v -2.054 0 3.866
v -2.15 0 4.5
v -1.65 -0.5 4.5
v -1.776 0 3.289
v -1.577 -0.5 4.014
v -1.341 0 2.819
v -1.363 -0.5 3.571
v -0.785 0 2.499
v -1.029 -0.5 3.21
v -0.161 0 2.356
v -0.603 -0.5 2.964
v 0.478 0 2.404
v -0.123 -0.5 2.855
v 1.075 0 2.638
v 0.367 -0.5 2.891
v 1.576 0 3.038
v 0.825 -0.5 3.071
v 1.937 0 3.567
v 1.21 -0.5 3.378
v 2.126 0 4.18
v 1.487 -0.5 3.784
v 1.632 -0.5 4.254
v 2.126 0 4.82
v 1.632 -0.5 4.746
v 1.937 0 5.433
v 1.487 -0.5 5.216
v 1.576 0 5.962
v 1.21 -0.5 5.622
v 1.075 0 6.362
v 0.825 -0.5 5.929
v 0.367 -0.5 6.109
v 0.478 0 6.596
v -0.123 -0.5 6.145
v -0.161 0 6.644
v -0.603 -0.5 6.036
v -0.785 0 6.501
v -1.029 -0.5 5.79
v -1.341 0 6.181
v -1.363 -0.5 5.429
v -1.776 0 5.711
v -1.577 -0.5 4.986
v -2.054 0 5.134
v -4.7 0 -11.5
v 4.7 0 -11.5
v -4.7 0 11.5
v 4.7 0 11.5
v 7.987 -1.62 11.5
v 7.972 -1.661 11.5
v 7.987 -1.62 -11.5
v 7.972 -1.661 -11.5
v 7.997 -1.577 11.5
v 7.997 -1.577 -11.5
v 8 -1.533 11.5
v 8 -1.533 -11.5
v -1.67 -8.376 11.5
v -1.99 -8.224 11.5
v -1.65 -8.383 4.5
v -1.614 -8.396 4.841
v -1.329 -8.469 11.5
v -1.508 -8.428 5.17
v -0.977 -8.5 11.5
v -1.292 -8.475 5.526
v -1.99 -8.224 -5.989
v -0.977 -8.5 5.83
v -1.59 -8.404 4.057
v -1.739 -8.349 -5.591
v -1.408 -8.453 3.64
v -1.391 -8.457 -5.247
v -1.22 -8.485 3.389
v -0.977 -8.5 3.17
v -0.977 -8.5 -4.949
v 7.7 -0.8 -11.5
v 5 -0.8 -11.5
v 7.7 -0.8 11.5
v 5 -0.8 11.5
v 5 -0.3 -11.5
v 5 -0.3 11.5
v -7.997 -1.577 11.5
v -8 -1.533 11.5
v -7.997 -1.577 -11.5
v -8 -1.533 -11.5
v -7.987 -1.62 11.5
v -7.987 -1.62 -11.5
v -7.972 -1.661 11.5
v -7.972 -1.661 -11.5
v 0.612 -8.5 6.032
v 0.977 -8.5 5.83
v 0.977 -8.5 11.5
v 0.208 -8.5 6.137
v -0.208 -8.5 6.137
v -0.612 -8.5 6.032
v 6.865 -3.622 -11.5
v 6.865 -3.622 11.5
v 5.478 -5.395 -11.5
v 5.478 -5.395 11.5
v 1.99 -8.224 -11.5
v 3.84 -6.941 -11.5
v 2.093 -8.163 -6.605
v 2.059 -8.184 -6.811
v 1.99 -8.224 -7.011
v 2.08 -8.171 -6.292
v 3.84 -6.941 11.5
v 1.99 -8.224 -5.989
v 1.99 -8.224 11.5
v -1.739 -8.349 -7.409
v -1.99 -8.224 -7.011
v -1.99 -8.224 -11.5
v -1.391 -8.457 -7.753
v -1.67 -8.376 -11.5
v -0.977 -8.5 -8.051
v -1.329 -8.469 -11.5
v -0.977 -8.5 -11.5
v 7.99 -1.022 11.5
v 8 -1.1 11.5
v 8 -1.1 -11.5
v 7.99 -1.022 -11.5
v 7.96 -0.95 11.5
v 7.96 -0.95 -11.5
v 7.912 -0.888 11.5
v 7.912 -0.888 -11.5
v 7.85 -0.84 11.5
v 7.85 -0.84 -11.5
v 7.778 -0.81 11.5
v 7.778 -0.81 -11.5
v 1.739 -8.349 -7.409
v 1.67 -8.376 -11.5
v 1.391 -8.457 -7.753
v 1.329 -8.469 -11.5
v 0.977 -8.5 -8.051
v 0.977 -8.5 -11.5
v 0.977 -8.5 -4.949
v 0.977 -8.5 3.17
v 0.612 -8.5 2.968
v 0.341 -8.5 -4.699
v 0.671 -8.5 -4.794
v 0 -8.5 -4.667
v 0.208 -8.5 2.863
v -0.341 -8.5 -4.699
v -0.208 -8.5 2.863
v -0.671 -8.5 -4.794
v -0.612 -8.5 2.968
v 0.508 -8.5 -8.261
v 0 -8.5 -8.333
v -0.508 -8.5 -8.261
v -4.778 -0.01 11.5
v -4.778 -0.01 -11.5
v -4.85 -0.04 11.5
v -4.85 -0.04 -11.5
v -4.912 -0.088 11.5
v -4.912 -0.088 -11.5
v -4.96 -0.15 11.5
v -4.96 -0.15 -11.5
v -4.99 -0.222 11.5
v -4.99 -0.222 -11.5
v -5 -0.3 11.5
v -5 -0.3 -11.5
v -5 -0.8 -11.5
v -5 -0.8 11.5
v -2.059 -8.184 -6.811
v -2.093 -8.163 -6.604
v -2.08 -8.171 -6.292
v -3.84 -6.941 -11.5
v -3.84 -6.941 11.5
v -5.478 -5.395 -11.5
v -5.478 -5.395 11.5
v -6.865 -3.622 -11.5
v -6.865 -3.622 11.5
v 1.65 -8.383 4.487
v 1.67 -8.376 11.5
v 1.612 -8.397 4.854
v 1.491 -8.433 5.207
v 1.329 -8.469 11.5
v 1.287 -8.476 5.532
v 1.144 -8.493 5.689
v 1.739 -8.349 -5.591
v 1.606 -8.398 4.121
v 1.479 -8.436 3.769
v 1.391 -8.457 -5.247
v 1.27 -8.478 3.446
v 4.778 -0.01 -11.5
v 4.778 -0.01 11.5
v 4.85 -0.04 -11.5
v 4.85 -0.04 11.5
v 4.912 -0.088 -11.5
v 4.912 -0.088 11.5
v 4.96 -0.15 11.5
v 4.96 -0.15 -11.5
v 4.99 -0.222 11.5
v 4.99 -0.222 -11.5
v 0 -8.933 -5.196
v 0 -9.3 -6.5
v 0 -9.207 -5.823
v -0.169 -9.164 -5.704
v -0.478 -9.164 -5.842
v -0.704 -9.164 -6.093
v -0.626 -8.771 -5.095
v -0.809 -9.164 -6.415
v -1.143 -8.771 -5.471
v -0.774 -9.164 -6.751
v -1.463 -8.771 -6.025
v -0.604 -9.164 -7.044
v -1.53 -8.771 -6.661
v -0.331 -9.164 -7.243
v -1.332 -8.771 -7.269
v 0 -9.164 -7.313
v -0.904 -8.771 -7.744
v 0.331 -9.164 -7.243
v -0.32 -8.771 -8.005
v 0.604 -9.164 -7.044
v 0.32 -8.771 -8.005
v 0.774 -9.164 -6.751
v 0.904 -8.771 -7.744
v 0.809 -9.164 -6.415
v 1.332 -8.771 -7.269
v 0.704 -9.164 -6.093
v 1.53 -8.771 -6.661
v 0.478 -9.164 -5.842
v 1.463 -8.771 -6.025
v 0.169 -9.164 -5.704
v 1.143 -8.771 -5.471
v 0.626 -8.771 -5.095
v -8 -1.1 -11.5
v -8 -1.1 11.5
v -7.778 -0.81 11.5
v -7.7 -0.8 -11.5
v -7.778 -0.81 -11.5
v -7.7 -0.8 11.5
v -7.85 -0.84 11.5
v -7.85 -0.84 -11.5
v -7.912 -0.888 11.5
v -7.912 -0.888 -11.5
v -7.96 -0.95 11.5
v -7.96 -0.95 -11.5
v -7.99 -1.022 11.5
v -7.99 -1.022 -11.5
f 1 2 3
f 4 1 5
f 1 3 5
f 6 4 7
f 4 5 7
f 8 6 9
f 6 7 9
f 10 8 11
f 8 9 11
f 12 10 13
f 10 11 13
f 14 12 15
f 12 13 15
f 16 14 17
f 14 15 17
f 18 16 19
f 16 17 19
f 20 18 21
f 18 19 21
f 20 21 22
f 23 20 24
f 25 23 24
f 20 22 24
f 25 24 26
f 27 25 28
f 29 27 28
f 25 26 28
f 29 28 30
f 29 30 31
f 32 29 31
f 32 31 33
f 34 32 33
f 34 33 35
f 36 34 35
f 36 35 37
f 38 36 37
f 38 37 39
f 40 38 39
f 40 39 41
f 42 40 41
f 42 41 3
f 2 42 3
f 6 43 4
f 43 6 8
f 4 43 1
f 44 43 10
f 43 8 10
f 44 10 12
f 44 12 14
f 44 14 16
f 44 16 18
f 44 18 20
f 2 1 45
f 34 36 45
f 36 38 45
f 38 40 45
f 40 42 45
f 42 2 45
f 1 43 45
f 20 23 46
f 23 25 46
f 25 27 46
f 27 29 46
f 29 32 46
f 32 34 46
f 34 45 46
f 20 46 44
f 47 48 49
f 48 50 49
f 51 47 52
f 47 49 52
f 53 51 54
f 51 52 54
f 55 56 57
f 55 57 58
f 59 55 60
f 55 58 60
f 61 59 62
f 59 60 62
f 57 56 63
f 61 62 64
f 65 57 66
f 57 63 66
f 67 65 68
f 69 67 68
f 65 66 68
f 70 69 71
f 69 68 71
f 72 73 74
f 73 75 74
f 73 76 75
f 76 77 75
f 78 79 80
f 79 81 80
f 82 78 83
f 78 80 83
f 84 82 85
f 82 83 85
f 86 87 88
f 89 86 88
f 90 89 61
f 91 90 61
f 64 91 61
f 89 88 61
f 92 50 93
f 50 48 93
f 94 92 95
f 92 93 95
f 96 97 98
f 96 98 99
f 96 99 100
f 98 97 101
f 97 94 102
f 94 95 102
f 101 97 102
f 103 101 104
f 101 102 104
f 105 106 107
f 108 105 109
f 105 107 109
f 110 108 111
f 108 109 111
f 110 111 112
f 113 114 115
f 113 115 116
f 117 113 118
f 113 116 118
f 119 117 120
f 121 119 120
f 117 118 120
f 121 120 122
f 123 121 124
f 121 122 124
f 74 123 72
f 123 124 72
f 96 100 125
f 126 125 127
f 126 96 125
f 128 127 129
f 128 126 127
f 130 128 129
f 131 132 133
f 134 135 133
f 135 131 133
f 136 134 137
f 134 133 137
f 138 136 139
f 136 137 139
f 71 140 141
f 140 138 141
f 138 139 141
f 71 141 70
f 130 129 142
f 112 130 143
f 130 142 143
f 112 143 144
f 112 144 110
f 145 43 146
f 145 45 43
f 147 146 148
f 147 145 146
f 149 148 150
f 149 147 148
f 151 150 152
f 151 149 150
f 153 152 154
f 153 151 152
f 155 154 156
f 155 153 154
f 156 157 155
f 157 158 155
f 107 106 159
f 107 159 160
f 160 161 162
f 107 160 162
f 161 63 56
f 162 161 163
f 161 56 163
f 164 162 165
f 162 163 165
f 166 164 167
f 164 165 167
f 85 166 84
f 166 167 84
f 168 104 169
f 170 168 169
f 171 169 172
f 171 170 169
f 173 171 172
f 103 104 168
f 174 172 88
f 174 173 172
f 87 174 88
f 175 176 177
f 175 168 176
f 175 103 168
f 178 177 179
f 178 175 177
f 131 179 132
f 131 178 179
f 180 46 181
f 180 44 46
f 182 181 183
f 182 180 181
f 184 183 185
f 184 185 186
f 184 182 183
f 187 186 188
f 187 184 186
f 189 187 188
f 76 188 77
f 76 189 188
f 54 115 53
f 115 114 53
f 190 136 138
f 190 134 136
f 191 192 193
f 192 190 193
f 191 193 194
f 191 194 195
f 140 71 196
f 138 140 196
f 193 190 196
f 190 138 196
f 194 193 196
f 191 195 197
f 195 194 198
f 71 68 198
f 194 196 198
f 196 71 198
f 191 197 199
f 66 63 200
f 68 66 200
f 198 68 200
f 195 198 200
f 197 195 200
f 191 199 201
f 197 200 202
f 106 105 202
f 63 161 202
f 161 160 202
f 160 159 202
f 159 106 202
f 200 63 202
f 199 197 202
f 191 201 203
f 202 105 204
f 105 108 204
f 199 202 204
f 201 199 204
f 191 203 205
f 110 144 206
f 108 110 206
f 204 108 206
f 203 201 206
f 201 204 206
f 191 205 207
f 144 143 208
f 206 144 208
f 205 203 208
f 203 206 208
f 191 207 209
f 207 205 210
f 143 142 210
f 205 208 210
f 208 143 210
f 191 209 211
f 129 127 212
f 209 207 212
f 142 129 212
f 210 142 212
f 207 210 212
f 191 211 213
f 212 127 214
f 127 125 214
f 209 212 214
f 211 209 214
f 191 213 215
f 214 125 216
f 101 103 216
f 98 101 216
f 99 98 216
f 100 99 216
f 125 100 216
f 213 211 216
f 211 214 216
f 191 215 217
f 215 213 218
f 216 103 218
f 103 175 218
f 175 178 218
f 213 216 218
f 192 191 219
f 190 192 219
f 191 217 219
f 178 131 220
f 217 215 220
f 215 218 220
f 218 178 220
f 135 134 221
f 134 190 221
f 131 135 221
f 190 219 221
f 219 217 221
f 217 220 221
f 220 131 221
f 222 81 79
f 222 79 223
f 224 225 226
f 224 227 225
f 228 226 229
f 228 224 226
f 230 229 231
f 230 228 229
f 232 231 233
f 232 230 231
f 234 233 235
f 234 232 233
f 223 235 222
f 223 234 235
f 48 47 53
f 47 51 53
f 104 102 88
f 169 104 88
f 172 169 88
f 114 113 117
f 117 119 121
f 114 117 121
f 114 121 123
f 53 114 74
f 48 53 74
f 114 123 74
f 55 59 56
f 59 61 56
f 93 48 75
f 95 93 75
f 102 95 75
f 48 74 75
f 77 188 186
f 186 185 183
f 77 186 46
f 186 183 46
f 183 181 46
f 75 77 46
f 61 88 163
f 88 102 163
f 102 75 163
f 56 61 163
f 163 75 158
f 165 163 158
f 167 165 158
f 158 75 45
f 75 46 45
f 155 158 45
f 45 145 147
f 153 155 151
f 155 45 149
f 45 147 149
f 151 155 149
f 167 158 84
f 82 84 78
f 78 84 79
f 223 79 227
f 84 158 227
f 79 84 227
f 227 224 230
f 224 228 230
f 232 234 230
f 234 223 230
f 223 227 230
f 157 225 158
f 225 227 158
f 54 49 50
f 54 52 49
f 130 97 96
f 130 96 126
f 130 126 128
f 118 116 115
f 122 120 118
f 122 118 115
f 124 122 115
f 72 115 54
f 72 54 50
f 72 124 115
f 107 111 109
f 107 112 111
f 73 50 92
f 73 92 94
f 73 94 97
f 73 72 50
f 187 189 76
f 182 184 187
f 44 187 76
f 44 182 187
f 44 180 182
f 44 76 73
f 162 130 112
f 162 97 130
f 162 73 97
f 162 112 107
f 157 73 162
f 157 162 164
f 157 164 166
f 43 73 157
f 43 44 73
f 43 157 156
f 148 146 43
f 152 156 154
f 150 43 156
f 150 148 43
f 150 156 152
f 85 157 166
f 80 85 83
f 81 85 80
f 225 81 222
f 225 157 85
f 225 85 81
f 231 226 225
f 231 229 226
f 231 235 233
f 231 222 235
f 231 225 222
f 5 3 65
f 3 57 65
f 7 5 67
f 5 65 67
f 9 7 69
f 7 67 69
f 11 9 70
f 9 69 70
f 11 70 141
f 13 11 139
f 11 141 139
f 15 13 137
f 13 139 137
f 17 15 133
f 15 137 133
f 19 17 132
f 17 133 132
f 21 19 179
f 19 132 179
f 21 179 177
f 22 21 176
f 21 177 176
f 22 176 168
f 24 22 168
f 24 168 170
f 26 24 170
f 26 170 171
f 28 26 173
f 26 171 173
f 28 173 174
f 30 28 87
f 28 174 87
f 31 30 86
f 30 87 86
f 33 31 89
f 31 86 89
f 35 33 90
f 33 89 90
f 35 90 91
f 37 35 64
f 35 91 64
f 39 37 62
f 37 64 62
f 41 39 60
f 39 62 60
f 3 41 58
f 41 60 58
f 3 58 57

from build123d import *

# Parameters (mm, degrees)
EXTRUDE_1_DEPTH             = 11.5
FILLET_1_R                  = 0.3
FILLET_2_R                  = 2
HOLE_WIZARD_M42_D           = 3.3
HOLE_WIZARD_M42_CSINK_D     = 4.3
HOLE_WIZARD_M42_CSINK_ANGLE = 90


with BuildPart() as part:
    # Эскиз1 → Бобышка-Вытянуть1 (new body, symmetric)
    with BuildSketch(Plane.XY):
        with BuildLine():
            Line((-5, 0), (5, 0))
            Line((5, 0), (5, -0.8))
            Line((5, -0.8), (8, -0.8))
            Line((8, -0.8), (8, -1.6))
            ThreePointArc((8, -1.6), (5.309398779, -5.576969864), (1.5, -8.5))
            Line((1.5, -8.5), (-1.5, -8.5))
            ThreePointArc((-1.5, -8.5), (-5.309398779, -5.576969864), (-8, -1.6))
            Line((-8, -1.6), (-8, -0.8))
            Line((-8, -0.8), (-5, -0.8))
            Line((-5, -0.8), (-5, 0))
        make_face()
    extrude(amount=EXTRUDE_1_DEPTH, both=True)

    # Скругление1
    fillet_1_edges = [part.edges().sort_by_distance(p)[0] for p in [
        (8, -0.8, 0),
        (8, -1.6, 0),
        (-8, -1.6, 0),
        (-8, -0.8, 0),
        (-5, 0, 0),
        (5, 0, 0),
    ]]
    fillet(fillet_1_edges, radius=FILLET_1_R)

    # Скругление2
    fillet_2_edges = [part.edges().sort_by_distance(p)[0] for p in [
        (1.5, -8.5, 0),
        (-1.5, -8.5, 0),
    ]]
    fillet(fillet_2_edges, radius=FILLET_2_R)

    # Отверстие обработанное метчиком M42 (through all)
    with Locations(Plane(origin=(0, 0, 0), x_dir=(1, 0, 0), z_dir=(0, 1, 0))):
        with Locations((0, -4.5)):
            CounterSinkHole(HOLE_WIZARD_M42_D / 2, HOLE_WIZARD_M42_CSINK_D / 2, counter_sink_angle=HOLE_WIZARD_M42_CSINK_ANGLE)

    # Эскиз5 → Повернуть1 (revolve)
    with BuildSketch(Plane(origin=(0, 0, 0), x_dir=(0, 0, -1), z_dir=(1, 0, 0))):
        with BuildLine():
            Line((6.5, -4.3), (6.5, -9.3))
            ThreePointArc((6.5, -9.3), (4, -6.8), (6.5, -4.3))
        make_face()
    revolve(axis=Axis((0, -4.3, -6.5), (0, -1, 0)))


solid = part.part
